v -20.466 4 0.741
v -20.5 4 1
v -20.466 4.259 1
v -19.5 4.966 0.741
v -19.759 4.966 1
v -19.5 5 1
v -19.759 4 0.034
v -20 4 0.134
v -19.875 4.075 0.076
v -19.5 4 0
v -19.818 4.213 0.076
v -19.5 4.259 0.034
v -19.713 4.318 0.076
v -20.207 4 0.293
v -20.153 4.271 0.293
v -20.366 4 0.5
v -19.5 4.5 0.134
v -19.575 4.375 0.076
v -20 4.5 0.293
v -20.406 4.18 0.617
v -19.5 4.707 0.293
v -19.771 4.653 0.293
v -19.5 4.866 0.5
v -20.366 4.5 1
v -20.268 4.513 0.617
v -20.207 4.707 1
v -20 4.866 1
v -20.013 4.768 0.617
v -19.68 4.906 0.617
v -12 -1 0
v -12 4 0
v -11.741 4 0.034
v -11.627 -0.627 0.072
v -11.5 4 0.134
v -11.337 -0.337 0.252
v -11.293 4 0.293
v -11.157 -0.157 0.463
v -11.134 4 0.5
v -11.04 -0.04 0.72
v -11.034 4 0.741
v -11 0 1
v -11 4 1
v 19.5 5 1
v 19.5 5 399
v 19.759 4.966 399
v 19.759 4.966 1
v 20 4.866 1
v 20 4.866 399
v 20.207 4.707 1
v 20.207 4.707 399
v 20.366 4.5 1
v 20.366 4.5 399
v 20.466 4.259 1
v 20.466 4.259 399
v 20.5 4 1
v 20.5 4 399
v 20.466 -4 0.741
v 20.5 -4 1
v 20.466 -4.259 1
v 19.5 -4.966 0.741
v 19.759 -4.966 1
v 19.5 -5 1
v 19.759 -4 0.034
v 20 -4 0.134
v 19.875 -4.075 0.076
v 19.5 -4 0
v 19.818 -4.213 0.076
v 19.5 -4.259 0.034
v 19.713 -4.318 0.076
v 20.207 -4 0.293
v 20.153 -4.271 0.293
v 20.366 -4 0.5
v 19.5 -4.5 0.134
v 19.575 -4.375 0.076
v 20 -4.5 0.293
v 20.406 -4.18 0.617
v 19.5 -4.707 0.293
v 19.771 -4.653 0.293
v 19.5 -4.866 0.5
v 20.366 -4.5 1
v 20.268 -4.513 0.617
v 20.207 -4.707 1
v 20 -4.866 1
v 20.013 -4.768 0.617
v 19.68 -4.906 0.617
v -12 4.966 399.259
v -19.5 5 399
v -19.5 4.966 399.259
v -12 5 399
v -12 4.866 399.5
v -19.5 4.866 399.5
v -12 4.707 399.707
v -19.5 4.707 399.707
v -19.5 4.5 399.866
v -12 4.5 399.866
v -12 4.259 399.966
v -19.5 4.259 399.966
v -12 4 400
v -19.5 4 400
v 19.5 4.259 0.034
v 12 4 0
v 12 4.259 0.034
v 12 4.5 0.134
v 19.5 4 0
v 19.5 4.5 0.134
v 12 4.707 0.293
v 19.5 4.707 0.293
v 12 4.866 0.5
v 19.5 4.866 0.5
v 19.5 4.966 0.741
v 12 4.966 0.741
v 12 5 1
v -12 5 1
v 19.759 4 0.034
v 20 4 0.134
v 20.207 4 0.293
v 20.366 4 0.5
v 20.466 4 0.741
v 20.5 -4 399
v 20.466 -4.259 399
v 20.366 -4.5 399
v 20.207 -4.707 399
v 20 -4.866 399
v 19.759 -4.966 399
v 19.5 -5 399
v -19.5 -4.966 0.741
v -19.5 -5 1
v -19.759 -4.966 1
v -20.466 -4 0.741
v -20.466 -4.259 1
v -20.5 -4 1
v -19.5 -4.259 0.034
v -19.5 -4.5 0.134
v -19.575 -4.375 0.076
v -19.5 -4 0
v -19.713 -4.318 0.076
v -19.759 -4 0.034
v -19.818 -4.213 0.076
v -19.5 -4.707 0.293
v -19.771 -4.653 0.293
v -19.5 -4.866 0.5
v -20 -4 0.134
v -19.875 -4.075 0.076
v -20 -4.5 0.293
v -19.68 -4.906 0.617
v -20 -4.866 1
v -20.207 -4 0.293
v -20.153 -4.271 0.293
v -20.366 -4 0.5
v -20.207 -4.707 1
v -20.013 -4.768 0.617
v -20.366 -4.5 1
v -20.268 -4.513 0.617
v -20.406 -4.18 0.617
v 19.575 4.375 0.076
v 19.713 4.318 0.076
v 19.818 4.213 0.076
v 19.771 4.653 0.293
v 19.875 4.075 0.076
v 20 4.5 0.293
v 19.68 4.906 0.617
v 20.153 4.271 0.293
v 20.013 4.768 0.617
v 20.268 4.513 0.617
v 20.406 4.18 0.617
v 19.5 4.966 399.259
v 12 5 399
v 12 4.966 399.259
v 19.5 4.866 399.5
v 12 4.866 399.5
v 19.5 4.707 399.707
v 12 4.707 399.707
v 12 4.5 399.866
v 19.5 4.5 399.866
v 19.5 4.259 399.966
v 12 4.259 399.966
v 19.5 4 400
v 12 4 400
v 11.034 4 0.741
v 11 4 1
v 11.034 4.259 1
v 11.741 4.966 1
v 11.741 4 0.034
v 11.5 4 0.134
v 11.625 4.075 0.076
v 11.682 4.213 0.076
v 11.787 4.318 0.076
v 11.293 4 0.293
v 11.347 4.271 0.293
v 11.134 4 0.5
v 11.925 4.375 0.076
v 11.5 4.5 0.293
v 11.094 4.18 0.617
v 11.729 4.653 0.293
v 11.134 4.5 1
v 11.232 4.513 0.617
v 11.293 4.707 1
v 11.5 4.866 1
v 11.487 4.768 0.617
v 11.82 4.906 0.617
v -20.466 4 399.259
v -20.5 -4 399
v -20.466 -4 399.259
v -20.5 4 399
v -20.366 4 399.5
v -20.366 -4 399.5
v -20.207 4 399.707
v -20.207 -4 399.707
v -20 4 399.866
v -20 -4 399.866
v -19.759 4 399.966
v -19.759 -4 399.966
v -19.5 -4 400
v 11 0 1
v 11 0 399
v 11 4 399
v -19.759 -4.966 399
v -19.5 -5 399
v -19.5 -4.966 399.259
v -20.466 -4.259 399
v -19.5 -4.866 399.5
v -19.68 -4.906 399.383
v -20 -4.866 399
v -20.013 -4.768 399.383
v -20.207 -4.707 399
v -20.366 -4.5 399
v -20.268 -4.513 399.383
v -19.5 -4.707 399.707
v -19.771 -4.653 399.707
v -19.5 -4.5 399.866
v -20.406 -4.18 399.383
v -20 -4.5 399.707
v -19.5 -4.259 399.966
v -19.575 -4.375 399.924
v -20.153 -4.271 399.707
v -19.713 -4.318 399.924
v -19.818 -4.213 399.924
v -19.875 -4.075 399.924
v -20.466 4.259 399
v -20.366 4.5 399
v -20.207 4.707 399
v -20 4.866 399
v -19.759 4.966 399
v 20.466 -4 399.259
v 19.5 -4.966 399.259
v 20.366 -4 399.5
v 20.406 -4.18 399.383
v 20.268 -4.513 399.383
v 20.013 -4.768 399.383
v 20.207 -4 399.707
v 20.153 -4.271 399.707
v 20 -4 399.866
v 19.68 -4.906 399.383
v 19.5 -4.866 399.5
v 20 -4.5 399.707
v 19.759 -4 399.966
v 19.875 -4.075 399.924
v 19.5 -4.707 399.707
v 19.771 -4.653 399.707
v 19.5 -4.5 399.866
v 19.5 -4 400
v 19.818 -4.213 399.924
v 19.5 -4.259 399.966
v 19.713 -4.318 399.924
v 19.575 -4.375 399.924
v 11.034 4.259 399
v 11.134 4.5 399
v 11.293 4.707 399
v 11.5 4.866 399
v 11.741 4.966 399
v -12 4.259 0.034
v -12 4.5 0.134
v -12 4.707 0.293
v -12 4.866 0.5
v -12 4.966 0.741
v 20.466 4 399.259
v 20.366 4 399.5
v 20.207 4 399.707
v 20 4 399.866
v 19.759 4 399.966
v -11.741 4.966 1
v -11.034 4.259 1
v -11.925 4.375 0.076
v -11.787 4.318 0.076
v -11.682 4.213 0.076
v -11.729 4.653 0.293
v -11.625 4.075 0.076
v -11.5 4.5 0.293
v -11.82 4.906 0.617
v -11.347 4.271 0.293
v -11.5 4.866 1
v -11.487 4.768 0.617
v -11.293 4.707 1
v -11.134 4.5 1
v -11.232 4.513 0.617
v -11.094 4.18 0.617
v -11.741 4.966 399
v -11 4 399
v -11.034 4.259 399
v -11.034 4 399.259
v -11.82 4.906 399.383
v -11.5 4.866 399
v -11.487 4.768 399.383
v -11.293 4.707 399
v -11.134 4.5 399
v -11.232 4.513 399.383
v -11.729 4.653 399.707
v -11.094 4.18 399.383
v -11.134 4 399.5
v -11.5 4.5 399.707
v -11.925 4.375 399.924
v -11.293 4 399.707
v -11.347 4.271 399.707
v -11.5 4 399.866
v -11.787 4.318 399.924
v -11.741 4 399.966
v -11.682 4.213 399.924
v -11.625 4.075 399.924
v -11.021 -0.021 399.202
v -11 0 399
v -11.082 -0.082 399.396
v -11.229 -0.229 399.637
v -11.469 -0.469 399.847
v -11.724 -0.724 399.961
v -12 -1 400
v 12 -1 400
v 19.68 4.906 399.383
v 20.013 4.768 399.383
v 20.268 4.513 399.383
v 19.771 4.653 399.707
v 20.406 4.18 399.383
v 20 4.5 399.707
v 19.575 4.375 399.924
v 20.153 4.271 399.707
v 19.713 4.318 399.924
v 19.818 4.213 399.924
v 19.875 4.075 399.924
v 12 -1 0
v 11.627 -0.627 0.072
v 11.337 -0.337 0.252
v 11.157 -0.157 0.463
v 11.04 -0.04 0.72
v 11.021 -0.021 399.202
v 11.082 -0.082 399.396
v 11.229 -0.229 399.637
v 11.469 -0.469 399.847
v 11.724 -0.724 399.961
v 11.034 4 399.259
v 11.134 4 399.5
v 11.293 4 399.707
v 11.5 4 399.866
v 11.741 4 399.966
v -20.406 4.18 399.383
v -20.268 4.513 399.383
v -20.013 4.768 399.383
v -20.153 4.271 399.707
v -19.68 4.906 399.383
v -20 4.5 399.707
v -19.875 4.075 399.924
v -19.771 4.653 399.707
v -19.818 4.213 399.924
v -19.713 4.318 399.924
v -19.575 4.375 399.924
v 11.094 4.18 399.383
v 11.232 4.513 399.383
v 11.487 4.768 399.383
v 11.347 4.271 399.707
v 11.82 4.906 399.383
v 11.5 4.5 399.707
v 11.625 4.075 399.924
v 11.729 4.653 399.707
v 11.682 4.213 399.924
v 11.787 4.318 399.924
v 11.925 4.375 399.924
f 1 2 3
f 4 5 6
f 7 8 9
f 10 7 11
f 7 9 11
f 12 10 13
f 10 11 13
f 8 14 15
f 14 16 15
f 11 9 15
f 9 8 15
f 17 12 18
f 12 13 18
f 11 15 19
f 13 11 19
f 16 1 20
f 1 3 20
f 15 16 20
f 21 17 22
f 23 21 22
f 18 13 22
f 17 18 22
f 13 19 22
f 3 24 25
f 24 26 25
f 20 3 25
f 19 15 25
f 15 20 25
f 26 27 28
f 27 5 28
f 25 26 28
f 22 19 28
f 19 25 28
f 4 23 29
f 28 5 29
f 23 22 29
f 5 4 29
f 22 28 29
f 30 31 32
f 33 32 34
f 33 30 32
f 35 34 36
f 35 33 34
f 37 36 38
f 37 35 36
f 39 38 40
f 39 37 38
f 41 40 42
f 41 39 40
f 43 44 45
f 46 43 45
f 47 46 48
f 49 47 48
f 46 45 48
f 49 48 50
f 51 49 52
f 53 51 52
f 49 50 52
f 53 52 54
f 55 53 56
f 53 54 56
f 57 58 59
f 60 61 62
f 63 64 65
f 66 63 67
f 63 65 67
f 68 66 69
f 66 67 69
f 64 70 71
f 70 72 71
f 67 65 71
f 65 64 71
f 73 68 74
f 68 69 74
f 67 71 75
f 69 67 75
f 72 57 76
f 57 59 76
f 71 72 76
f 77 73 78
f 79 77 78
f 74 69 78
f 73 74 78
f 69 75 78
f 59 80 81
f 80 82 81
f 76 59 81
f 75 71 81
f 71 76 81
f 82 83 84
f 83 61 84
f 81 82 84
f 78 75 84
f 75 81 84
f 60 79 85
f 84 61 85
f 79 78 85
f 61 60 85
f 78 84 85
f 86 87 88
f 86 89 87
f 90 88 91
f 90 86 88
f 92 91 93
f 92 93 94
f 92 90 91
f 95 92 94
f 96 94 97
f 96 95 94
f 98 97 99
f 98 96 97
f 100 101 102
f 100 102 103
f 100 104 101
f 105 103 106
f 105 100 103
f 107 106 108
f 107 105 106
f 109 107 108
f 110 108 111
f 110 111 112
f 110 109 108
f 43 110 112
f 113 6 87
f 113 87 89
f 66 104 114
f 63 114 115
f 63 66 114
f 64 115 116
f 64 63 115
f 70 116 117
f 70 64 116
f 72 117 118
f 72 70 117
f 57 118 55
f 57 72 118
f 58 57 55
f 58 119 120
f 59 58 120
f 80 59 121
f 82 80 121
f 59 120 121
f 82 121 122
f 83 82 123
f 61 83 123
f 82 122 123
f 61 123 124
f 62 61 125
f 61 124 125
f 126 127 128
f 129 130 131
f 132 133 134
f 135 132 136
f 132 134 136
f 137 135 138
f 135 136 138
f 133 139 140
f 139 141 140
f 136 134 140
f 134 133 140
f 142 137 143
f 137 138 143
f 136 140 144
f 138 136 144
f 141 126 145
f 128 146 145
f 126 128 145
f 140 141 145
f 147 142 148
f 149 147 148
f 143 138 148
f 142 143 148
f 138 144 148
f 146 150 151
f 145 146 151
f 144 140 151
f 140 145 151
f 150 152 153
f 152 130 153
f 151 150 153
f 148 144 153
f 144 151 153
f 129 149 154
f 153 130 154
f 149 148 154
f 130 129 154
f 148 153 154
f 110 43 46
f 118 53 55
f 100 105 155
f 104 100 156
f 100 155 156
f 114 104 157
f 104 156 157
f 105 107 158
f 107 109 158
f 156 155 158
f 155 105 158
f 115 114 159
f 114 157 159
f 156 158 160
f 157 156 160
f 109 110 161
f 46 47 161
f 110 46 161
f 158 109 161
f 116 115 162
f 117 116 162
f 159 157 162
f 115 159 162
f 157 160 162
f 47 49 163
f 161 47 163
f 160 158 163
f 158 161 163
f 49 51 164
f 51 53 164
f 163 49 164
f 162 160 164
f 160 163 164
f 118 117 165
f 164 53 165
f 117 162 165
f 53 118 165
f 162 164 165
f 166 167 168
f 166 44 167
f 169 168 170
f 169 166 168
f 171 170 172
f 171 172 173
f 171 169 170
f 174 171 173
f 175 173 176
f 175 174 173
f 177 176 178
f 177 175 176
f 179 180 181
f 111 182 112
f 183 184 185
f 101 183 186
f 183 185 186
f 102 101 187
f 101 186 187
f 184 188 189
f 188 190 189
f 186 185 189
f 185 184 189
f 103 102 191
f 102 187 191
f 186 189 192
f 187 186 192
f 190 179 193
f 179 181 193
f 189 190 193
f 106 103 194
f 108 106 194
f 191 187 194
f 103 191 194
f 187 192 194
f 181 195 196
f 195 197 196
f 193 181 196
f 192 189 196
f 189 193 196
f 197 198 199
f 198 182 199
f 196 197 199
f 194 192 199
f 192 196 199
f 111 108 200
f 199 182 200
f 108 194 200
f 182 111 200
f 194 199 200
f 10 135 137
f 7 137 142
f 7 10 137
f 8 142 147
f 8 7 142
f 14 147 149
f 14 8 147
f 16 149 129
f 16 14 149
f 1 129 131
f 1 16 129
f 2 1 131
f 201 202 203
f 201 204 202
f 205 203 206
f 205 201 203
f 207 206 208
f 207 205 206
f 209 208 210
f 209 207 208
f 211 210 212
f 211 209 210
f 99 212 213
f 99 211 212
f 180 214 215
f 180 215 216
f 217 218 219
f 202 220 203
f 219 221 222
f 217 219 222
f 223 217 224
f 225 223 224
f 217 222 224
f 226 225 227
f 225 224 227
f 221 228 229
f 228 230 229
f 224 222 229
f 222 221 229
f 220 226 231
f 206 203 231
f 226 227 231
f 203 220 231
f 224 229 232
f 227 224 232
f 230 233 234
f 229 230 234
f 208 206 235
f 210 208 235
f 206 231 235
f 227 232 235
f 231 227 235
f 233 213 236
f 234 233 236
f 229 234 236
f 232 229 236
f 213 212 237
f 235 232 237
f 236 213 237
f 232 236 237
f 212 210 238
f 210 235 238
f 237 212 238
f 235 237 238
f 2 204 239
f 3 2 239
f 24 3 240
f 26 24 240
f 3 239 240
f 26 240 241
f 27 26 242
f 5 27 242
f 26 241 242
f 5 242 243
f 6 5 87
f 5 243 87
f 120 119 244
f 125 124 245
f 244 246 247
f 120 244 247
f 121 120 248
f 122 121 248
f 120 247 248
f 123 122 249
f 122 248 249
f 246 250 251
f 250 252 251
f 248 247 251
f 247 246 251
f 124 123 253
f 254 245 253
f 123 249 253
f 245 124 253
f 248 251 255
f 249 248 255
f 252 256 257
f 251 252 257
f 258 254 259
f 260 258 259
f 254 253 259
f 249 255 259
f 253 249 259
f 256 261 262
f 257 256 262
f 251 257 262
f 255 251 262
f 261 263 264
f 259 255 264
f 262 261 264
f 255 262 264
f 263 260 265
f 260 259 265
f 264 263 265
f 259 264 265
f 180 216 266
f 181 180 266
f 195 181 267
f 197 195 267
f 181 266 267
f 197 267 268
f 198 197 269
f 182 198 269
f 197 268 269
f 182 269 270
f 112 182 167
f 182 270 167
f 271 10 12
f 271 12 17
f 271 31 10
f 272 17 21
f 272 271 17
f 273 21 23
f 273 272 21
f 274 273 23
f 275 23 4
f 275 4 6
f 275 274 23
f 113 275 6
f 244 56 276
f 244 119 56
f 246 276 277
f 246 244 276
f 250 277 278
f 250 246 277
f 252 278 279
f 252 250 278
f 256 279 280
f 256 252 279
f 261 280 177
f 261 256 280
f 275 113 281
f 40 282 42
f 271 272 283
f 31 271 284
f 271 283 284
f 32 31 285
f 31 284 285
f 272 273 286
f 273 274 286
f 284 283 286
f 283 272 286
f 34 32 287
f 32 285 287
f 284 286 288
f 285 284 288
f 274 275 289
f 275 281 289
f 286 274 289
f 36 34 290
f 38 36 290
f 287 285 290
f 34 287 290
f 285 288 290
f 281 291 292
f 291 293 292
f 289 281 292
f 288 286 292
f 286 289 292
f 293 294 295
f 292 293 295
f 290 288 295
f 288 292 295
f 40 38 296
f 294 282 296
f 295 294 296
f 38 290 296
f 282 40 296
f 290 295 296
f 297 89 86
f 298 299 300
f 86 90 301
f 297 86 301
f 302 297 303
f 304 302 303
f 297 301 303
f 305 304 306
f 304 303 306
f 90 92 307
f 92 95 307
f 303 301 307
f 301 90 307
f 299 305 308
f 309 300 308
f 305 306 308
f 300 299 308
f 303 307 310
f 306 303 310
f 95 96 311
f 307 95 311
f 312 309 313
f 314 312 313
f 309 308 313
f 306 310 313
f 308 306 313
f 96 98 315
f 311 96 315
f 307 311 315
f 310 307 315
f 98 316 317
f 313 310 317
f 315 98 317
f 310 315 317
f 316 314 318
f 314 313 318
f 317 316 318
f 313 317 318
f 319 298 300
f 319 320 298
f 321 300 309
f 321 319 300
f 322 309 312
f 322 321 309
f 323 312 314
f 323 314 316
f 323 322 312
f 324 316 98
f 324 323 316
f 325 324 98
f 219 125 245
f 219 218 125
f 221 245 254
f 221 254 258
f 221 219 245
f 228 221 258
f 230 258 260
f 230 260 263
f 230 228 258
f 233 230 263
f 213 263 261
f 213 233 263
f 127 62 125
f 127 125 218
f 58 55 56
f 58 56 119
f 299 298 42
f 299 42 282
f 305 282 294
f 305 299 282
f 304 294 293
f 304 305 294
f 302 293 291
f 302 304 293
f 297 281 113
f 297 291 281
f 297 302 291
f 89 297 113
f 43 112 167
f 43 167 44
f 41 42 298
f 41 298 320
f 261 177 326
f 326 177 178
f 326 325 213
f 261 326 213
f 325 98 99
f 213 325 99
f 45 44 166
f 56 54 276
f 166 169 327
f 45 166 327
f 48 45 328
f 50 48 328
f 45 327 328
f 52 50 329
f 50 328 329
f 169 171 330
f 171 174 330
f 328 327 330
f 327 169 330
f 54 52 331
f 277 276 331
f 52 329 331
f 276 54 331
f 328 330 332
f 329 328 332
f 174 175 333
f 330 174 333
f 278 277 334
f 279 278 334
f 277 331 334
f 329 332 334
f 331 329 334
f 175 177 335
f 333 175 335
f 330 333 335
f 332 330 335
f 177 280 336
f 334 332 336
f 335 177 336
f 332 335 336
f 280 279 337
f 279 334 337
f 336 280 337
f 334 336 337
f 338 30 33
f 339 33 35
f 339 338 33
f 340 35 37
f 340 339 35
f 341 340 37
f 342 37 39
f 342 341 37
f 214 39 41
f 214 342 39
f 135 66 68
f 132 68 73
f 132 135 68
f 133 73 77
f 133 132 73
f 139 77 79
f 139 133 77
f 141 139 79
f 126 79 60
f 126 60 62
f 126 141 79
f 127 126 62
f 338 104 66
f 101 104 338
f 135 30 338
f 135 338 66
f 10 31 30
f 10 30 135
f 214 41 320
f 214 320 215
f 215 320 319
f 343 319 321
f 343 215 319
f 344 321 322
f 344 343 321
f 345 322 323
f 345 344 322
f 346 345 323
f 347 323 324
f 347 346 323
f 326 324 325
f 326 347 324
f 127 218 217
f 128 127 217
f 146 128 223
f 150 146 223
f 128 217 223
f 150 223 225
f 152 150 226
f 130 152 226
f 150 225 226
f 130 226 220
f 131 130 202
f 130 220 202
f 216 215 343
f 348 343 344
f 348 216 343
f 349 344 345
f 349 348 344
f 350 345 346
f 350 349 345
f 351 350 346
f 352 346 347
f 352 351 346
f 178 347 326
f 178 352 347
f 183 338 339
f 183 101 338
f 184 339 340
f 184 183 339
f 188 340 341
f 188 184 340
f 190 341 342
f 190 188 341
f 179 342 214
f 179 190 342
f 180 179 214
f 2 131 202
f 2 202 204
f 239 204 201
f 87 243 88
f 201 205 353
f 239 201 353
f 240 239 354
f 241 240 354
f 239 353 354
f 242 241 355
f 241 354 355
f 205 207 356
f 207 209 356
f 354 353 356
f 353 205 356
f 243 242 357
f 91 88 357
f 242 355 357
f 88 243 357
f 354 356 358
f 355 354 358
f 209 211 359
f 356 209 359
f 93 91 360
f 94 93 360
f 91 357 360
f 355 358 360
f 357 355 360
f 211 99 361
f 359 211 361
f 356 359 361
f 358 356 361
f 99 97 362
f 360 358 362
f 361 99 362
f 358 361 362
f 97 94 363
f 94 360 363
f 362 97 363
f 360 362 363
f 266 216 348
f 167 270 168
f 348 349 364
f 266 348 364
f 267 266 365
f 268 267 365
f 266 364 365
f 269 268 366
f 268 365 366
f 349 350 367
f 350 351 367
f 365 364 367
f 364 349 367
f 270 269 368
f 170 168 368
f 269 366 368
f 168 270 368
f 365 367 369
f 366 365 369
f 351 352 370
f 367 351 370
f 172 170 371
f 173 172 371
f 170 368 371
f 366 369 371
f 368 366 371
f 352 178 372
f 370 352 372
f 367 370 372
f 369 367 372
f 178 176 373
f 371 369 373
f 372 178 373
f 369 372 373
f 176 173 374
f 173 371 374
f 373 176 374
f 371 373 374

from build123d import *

# Parameters (mm, degrees)
BOSS_EXTRUDE1_DEPTH = 400
FILLET1_R           = 1
FILLET2_R           = 1


with BuildPart() as part:
    # Sketch1 → Boss-Extrude1 (new body)
    with BuildSketch(Plane.XY):
        Polygon((-11, 5), (-11, 0), (11, 0), (11, 5), (20.5, 5), (20.5, -5), (-20.5, -5), (-20.5, 5), align=None)
    extrude(amount=BOSS_EXTRUDE1_DEPTH)

    # Fillet1
    fillet1_edges = [part.edges().sort_by_distance(p)[0] for p in [
        (20.5, 5, 200),
        (20.5, -5, 200),
        (-20.5, -5, 200),
        (-20.5, 5, 200),
        (-11, 5, 200),
        (11, 5, 200),
    ]]
    fillet(fillet1_edges, radius=FILLET1_R)

    # Fillet2
    fillet2_edges = [part.edges().sort_by_distance(p)[0] for p in [
        (0, 0, 400),
        (-11, 2, 400),
        (11, 2, 0),
        (11, 2, 400),
        (15.75, 5, 0),
        (20.5, 0, 0),
        (0, -5, 0),
        (-20.5, 0, 0),
        (-15.75, 5, 0),
        (20.207106781, 4.707106781, 0),
        (-20.207106781, 4.707106781, 0),
        (-20.207106781, -4.707106781, 0),
        (20.207106781, -4.707106781, 0),
        (-11.292893219, 4.707106781, 0),
        (11.292893219, 4.707106781, 0),
        (15.75, 5, 400),
        (-15.75, 5, 400),
        (-20.5, 0, 400),
        (0, -5, 400),
        (20.5, 0, 400),
        (20.207106781, 4.707106781, 400),
        (-20.207106781, 4.707106781, 400),
        (-20.207106781, -4.707106781, 400),
        (20.207106781, -4.707106781, 400),
        (-11.292893219, 4.707106781, 400),
        (11.292893219, 4.707106781, 400),
        (-11, 2, 0),
        (0, 0, 0),
    ]]
    fillet(fillet2_edges, radius=FILLET2_R)


solid = part.part
